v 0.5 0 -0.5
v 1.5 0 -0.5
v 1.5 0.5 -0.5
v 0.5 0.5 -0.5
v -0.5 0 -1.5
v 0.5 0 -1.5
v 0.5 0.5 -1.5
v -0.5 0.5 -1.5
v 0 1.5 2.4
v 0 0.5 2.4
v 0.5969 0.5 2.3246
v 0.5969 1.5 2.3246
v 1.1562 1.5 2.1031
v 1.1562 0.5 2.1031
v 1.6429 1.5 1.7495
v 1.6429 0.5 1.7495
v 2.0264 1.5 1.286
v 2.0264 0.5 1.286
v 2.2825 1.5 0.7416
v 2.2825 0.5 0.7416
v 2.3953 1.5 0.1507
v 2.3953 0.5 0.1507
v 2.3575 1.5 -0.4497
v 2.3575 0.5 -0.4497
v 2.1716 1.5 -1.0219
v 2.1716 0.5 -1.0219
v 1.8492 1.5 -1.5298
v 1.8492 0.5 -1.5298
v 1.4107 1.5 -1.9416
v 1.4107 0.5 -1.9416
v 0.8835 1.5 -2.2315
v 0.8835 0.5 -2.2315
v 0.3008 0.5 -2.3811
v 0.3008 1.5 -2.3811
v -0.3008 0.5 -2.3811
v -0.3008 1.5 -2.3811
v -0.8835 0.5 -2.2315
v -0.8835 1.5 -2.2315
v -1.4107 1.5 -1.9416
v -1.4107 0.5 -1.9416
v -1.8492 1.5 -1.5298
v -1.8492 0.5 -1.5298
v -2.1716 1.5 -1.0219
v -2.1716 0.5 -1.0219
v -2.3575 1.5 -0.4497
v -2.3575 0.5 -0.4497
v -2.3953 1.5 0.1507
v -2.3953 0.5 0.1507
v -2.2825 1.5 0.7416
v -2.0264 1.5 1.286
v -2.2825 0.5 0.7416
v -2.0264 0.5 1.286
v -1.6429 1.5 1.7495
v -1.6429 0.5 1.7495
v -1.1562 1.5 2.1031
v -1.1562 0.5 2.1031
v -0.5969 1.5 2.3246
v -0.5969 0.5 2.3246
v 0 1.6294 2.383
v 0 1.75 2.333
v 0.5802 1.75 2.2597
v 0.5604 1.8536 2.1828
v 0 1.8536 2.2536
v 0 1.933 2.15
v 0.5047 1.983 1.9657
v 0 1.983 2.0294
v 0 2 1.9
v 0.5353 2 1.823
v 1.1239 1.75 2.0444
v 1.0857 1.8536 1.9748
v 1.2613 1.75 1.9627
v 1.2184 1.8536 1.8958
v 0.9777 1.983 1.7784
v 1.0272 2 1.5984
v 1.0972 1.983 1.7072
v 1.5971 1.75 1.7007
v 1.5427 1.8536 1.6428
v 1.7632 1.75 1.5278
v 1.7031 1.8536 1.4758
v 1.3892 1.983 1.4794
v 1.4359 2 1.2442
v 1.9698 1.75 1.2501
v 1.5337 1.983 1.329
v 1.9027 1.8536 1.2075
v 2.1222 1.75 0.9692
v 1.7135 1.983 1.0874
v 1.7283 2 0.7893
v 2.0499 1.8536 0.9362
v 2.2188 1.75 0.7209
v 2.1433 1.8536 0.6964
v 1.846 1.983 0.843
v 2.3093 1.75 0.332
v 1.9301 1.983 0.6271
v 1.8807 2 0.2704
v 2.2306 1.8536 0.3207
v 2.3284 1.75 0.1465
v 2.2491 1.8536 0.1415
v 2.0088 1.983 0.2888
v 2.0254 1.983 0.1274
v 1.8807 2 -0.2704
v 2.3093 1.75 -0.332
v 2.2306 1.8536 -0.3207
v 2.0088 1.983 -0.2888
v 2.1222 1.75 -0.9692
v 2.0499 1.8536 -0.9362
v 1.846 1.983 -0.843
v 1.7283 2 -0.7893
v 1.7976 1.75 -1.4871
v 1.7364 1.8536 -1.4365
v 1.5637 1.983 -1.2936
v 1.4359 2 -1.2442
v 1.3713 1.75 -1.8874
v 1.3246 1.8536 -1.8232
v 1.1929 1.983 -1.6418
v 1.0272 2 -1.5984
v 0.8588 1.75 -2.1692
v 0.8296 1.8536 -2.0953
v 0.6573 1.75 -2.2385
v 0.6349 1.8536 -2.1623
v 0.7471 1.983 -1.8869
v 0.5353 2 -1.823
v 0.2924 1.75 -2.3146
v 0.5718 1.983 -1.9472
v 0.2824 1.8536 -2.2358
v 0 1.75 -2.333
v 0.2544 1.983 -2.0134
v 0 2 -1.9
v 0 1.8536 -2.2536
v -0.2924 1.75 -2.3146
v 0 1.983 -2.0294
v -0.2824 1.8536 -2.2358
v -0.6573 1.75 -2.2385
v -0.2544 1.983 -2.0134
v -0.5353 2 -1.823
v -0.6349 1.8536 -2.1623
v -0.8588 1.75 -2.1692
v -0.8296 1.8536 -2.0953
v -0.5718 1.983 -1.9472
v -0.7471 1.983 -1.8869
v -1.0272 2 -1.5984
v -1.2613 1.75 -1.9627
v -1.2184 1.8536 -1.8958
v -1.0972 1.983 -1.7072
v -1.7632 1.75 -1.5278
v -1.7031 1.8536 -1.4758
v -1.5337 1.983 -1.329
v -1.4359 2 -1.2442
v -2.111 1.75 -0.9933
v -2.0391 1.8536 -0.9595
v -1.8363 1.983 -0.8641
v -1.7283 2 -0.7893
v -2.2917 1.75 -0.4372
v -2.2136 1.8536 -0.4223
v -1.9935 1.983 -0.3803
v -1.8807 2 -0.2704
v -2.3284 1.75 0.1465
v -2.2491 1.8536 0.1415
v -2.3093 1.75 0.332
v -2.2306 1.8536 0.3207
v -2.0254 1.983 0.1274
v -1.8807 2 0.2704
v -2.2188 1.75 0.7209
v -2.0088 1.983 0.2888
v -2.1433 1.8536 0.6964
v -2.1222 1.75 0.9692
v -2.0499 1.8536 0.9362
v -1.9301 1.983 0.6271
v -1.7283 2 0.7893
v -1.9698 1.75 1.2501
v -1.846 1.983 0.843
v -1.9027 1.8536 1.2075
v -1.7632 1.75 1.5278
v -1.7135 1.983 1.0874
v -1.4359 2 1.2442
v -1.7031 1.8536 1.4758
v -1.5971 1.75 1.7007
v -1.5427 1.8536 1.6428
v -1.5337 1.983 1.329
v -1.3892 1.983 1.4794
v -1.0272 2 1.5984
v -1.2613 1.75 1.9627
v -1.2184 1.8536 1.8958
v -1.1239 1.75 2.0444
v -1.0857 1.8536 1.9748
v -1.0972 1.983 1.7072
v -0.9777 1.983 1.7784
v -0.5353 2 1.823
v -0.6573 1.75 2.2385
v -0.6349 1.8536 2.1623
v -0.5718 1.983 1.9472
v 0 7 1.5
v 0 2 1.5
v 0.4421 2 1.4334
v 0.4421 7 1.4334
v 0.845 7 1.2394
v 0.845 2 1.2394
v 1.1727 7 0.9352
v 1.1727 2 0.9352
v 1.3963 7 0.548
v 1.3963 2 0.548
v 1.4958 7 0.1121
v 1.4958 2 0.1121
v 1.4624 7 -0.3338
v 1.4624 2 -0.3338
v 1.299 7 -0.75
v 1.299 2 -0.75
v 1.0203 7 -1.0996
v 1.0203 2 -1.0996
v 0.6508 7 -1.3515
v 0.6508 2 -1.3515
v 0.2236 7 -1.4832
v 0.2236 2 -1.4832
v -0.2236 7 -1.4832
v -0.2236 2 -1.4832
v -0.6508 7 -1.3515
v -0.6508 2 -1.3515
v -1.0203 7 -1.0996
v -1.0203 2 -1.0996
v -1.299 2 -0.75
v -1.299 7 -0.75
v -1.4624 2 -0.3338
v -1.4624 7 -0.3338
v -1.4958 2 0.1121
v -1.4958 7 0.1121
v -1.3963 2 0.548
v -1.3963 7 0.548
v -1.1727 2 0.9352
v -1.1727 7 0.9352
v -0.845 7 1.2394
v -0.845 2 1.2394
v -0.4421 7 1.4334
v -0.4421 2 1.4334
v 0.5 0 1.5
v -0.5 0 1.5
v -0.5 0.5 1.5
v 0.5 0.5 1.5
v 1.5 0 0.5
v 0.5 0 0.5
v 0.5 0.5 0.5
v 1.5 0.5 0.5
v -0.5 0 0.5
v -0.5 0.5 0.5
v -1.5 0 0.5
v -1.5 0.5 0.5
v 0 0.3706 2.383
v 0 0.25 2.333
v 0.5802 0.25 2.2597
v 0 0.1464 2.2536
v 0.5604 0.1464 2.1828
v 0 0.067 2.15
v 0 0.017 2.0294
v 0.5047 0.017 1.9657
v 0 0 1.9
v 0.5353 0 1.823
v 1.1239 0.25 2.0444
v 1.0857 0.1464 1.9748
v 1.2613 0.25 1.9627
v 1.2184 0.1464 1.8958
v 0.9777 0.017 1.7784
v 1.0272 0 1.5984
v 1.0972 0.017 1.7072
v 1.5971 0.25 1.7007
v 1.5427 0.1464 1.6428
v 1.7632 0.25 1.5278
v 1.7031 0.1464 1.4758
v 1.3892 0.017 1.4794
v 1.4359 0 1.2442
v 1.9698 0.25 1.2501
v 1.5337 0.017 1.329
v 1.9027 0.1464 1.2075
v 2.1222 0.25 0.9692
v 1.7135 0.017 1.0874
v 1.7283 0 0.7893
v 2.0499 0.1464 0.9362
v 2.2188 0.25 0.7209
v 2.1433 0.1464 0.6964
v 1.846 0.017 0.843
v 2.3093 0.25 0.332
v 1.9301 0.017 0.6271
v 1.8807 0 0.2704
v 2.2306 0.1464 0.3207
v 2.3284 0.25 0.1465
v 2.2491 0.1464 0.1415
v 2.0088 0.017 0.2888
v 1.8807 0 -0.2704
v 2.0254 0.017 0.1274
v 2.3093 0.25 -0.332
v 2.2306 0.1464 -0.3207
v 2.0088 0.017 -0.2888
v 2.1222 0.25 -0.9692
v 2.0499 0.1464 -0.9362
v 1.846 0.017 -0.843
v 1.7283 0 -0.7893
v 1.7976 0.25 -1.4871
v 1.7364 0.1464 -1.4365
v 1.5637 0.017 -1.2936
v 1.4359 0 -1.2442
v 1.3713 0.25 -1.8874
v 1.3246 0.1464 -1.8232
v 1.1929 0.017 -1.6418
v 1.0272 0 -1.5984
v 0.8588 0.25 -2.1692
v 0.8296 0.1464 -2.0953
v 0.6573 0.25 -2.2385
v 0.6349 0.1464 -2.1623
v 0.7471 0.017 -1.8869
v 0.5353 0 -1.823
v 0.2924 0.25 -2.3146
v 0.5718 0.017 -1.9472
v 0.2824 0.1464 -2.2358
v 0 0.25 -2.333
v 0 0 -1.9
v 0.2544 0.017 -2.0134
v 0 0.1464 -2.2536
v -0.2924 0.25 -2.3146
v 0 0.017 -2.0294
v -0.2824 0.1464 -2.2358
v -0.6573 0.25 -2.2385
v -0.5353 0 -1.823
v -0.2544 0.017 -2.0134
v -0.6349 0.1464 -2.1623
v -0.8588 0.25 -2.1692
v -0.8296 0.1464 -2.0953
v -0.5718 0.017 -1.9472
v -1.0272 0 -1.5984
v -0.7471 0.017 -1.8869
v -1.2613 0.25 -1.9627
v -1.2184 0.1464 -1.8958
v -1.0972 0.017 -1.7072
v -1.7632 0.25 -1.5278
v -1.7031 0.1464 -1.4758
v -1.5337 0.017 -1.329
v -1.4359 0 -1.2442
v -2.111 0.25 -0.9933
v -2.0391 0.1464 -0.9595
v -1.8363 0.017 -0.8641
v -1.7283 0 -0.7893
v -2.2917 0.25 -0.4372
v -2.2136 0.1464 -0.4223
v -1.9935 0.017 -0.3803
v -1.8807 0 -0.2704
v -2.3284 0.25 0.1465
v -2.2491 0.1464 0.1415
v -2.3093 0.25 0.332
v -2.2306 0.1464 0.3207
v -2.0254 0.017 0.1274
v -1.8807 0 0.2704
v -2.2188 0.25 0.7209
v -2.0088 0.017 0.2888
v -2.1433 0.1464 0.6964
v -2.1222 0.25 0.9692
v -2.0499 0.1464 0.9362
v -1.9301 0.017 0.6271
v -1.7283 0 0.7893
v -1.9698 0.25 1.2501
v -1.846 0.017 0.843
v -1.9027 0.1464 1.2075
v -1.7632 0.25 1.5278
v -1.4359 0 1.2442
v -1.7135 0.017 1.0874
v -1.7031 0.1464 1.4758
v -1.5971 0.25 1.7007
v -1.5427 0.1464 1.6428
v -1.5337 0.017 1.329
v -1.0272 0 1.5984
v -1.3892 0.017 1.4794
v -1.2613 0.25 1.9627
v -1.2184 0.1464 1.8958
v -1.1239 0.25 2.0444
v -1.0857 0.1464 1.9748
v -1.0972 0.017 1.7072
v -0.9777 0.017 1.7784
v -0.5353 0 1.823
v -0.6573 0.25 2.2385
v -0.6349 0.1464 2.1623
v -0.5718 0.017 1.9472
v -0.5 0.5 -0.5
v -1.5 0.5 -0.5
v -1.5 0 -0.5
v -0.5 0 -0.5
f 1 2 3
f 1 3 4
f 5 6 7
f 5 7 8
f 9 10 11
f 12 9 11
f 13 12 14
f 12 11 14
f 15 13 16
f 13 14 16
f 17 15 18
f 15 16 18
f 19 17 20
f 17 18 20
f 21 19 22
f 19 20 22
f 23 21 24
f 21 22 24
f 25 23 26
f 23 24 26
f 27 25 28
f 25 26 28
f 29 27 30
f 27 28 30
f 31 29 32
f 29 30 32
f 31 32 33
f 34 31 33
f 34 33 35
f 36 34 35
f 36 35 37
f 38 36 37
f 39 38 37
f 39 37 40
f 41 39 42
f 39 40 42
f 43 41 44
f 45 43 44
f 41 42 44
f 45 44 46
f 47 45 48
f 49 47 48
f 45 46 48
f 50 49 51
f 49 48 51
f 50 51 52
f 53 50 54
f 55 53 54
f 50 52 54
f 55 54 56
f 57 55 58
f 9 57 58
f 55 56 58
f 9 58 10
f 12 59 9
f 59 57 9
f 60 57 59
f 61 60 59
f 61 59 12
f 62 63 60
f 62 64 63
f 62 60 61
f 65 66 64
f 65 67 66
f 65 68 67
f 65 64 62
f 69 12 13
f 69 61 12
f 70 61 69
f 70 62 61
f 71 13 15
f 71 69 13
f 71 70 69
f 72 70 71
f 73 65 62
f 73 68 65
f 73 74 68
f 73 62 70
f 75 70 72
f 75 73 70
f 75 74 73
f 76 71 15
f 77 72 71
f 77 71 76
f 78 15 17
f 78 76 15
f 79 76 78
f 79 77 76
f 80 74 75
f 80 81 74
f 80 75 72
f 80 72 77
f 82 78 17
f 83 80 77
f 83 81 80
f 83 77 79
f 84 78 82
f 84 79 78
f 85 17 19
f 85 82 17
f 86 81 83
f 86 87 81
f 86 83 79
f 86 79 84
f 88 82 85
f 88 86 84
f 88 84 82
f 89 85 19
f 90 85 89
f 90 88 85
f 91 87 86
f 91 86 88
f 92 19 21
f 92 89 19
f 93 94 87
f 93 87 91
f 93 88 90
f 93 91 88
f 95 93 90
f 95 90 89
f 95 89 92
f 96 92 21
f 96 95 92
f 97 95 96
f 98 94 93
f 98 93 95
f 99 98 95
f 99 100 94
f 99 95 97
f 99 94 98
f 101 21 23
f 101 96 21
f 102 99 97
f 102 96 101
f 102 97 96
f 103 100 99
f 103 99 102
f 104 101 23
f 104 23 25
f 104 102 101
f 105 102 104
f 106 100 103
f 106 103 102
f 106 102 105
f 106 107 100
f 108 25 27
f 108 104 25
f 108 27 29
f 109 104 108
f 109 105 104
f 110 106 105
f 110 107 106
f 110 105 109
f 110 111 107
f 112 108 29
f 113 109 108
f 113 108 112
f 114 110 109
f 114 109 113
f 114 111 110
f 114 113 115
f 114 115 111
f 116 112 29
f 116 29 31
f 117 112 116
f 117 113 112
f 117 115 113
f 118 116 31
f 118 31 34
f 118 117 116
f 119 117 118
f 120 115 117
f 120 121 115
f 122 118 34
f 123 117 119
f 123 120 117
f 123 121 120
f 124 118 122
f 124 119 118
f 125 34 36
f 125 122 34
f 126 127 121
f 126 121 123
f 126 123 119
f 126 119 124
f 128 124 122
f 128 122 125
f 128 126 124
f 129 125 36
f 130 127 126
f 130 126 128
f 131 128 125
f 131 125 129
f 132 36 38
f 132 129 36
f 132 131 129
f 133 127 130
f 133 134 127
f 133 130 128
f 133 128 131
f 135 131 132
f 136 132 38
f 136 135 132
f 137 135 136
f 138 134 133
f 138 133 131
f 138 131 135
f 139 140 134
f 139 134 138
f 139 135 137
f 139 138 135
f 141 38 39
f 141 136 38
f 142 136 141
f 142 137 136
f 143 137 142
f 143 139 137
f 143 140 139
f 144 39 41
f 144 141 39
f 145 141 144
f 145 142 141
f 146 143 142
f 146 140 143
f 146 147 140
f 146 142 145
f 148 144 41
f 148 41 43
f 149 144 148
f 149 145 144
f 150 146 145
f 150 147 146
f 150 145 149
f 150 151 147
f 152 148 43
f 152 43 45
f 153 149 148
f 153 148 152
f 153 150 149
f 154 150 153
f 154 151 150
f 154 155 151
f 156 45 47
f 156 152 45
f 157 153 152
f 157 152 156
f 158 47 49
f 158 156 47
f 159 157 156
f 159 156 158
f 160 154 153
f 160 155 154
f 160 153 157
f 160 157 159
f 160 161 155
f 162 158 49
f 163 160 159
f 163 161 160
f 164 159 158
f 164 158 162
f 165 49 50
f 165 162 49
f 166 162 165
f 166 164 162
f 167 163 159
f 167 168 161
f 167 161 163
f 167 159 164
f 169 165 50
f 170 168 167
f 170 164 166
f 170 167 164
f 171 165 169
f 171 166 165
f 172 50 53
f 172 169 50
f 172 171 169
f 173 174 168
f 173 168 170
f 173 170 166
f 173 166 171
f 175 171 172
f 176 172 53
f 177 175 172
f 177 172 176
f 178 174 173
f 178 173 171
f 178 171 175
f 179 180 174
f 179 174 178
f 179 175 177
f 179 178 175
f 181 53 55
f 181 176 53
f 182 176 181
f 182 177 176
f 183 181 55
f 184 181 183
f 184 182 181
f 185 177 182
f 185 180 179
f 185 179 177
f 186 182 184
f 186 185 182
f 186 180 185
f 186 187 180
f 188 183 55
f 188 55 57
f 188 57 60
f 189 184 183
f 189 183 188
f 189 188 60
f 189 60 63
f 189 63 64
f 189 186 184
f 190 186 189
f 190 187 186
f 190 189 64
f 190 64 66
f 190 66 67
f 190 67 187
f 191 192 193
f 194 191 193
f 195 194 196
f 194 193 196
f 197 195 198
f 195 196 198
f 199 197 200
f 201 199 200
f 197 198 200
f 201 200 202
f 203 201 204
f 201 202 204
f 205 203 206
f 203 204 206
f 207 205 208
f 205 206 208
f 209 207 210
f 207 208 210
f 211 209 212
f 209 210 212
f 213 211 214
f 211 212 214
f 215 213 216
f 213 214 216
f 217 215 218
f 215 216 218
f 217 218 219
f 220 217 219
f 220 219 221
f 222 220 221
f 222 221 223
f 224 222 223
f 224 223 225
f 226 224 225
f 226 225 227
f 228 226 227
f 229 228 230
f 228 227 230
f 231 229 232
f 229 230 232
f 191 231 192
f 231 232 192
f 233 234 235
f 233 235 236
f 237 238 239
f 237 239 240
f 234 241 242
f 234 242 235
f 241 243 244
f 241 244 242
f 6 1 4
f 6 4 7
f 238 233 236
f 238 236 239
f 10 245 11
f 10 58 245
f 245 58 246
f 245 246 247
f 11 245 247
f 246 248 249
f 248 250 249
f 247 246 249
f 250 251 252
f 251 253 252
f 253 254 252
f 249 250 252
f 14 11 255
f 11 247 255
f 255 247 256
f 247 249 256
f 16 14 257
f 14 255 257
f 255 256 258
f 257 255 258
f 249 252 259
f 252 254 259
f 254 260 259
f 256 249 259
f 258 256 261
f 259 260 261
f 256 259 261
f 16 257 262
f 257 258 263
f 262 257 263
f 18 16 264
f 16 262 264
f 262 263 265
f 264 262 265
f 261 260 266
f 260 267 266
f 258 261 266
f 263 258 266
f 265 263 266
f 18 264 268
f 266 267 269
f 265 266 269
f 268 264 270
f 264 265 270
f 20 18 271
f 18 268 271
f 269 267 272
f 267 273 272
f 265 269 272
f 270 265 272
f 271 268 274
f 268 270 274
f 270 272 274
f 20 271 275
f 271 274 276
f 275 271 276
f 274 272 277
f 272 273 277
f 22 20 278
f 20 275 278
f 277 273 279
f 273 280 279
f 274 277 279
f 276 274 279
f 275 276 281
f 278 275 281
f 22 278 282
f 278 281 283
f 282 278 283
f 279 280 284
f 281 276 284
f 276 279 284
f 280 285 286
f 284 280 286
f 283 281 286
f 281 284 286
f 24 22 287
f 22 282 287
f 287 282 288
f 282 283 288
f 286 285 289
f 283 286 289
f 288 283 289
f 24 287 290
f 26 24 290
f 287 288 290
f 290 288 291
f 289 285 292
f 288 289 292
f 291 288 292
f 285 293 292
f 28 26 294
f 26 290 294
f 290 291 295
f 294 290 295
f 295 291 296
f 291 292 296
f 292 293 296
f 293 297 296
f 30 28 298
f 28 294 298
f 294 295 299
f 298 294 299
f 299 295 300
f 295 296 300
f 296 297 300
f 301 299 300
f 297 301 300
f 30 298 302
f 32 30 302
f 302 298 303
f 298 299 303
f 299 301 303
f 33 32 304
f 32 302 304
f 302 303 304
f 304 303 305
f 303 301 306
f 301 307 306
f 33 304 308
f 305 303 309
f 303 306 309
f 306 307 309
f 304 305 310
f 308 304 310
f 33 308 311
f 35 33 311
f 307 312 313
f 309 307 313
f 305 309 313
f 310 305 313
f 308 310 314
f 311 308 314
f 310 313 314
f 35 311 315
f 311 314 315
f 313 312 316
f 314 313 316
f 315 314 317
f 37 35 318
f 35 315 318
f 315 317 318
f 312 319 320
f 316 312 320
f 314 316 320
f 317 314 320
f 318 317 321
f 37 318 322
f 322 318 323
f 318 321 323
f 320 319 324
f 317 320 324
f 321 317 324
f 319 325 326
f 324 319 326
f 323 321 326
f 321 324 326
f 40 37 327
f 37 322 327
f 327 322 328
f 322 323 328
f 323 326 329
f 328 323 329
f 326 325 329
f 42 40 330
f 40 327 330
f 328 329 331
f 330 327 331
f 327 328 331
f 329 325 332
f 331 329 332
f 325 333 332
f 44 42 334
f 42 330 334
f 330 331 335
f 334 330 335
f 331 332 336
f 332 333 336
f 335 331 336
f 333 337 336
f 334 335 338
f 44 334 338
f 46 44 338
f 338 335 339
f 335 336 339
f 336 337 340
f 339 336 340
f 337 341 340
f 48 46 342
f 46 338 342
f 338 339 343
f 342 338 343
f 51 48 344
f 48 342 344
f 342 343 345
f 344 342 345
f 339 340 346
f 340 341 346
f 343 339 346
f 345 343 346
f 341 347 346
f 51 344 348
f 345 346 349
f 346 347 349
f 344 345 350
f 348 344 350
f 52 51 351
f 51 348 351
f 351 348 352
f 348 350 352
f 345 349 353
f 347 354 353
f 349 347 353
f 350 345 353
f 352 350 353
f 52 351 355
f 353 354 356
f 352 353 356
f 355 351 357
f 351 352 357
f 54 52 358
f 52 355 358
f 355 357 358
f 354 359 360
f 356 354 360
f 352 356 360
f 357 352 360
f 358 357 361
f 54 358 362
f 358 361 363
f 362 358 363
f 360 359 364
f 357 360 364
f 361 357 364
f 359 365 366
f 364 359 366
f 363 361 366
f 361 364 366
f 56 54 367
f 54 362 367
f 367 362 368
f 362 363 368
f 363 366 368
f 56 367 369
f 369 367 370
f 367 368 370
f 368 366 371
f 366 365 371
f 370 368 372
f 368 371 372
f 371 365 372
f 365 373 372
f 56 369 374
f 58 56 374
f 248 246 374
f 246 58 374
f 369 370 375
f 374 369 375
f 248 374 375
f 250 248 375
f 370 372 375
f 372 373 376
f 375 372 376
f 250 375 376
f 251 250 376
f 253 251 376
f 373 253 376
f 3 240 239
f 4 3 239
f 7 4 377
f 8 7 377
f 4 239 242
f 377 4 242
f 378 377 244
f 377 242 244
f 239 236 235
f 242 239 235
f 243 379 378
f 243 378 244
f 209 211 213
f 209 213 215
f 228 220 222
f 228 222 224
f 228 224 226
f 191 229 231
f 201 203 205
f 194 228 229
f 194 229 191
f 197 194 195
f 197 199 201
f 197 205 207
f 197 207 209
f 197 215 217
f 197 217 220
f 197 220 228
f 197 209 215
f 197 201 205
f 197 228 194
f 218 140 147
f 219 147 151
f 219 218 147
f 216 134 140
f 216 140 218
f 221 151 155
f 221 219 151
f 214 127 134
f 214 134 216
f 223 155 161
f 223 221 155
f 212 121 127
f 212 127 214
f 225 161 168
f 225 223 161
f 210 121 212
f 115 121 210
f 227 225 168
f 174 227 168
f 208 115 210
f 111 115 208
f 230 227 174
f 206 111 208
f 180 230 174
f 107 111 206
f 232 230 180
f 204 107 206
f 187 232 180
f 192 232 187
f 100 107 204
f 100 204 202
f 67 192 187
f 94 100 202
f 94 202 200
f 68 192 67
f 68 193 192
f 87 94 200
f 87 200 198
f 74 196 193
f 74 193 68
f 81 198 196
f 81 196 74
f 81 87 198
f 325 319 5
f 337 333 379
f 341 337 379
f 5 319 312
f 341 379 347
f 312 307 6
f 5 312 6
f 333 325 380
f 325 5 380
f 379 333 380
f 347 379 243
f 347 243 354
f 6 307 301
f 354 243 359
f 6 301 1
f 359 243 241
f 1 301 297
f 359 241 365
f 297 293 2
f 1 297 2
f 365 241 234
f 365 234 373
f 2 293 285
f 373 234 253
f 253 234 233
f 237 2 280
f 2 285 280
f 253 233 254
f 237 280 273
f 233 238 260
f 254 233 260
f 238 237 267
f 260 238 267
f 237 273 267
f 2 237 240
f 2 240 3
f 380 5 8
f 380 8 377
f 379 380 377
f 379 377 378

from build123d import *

# Parameters (mm, degrees)
SKETCH1_R           = 2.4
BOSS_EXTRUDE1_DEPTH = 2
SKETCH2_R           = 1.5
BOSS_EXTRUDE2_DEPTH = 5
FILLET1_R           = 0.5
CUT_EXTRUDE1_DEPTH  = 0.5


with BuildPart() as part:
    # Sketch1 → Boss-Extrude1 (new body)
    with BuildSketch(Plane(origin=(0, 0, 0), x_dir=(1, 0, 0), z_dir=(0, 1, 0))):
        with Locations(Location((0, 0, 0), (0, 0, 270))):
            Circle(SKETCH1_R)
    extrude(amount=BOSS_EXTRUDE1_DEPTH)

    # Sketch2 → Boss-Extrude2 (add)
    with BuildSketch(Plane(origin=(0, 2, 0), x_dir=(1, 0, 0), z_dir=(0, 1, 0))):
        with Locations(Location((0, 0, 0), (0, 0, 270))):
            Circle(SKETCH2_R)
    extrude(amount=BOSS_EXTRUDE2_DEPTH)

    # Fillet1
    fillet1_edges = [part.edges().sort_by_distance(p)[0] for p in [
        (0, 0, -2.4),
        (0, 2, -2.4),
    ]]
    fillet(fillet1_edges, radius=FILLET1_R)

    # Sketch3 → Cut-Extrude1 (cut)
    with BuildSketch(Plane.XZ):
        Polygon((0.5, 0.5), (1.5, 0.5), (1.5, -0.5), (0.5, -0.5), (0.5, -1.5), (-0.5, -1.5), (-0.5, -0.5), (-1.5, -0.5), (-1.5, 0.5), (-0.5, 0.5), (-0.5, 1.5), (0.5, 1.5), align=None)
    extrude(amount=-CUT_EXTRUDE1_DEPTH, mode=Mode.SUBTRACT)


solid = part.part
